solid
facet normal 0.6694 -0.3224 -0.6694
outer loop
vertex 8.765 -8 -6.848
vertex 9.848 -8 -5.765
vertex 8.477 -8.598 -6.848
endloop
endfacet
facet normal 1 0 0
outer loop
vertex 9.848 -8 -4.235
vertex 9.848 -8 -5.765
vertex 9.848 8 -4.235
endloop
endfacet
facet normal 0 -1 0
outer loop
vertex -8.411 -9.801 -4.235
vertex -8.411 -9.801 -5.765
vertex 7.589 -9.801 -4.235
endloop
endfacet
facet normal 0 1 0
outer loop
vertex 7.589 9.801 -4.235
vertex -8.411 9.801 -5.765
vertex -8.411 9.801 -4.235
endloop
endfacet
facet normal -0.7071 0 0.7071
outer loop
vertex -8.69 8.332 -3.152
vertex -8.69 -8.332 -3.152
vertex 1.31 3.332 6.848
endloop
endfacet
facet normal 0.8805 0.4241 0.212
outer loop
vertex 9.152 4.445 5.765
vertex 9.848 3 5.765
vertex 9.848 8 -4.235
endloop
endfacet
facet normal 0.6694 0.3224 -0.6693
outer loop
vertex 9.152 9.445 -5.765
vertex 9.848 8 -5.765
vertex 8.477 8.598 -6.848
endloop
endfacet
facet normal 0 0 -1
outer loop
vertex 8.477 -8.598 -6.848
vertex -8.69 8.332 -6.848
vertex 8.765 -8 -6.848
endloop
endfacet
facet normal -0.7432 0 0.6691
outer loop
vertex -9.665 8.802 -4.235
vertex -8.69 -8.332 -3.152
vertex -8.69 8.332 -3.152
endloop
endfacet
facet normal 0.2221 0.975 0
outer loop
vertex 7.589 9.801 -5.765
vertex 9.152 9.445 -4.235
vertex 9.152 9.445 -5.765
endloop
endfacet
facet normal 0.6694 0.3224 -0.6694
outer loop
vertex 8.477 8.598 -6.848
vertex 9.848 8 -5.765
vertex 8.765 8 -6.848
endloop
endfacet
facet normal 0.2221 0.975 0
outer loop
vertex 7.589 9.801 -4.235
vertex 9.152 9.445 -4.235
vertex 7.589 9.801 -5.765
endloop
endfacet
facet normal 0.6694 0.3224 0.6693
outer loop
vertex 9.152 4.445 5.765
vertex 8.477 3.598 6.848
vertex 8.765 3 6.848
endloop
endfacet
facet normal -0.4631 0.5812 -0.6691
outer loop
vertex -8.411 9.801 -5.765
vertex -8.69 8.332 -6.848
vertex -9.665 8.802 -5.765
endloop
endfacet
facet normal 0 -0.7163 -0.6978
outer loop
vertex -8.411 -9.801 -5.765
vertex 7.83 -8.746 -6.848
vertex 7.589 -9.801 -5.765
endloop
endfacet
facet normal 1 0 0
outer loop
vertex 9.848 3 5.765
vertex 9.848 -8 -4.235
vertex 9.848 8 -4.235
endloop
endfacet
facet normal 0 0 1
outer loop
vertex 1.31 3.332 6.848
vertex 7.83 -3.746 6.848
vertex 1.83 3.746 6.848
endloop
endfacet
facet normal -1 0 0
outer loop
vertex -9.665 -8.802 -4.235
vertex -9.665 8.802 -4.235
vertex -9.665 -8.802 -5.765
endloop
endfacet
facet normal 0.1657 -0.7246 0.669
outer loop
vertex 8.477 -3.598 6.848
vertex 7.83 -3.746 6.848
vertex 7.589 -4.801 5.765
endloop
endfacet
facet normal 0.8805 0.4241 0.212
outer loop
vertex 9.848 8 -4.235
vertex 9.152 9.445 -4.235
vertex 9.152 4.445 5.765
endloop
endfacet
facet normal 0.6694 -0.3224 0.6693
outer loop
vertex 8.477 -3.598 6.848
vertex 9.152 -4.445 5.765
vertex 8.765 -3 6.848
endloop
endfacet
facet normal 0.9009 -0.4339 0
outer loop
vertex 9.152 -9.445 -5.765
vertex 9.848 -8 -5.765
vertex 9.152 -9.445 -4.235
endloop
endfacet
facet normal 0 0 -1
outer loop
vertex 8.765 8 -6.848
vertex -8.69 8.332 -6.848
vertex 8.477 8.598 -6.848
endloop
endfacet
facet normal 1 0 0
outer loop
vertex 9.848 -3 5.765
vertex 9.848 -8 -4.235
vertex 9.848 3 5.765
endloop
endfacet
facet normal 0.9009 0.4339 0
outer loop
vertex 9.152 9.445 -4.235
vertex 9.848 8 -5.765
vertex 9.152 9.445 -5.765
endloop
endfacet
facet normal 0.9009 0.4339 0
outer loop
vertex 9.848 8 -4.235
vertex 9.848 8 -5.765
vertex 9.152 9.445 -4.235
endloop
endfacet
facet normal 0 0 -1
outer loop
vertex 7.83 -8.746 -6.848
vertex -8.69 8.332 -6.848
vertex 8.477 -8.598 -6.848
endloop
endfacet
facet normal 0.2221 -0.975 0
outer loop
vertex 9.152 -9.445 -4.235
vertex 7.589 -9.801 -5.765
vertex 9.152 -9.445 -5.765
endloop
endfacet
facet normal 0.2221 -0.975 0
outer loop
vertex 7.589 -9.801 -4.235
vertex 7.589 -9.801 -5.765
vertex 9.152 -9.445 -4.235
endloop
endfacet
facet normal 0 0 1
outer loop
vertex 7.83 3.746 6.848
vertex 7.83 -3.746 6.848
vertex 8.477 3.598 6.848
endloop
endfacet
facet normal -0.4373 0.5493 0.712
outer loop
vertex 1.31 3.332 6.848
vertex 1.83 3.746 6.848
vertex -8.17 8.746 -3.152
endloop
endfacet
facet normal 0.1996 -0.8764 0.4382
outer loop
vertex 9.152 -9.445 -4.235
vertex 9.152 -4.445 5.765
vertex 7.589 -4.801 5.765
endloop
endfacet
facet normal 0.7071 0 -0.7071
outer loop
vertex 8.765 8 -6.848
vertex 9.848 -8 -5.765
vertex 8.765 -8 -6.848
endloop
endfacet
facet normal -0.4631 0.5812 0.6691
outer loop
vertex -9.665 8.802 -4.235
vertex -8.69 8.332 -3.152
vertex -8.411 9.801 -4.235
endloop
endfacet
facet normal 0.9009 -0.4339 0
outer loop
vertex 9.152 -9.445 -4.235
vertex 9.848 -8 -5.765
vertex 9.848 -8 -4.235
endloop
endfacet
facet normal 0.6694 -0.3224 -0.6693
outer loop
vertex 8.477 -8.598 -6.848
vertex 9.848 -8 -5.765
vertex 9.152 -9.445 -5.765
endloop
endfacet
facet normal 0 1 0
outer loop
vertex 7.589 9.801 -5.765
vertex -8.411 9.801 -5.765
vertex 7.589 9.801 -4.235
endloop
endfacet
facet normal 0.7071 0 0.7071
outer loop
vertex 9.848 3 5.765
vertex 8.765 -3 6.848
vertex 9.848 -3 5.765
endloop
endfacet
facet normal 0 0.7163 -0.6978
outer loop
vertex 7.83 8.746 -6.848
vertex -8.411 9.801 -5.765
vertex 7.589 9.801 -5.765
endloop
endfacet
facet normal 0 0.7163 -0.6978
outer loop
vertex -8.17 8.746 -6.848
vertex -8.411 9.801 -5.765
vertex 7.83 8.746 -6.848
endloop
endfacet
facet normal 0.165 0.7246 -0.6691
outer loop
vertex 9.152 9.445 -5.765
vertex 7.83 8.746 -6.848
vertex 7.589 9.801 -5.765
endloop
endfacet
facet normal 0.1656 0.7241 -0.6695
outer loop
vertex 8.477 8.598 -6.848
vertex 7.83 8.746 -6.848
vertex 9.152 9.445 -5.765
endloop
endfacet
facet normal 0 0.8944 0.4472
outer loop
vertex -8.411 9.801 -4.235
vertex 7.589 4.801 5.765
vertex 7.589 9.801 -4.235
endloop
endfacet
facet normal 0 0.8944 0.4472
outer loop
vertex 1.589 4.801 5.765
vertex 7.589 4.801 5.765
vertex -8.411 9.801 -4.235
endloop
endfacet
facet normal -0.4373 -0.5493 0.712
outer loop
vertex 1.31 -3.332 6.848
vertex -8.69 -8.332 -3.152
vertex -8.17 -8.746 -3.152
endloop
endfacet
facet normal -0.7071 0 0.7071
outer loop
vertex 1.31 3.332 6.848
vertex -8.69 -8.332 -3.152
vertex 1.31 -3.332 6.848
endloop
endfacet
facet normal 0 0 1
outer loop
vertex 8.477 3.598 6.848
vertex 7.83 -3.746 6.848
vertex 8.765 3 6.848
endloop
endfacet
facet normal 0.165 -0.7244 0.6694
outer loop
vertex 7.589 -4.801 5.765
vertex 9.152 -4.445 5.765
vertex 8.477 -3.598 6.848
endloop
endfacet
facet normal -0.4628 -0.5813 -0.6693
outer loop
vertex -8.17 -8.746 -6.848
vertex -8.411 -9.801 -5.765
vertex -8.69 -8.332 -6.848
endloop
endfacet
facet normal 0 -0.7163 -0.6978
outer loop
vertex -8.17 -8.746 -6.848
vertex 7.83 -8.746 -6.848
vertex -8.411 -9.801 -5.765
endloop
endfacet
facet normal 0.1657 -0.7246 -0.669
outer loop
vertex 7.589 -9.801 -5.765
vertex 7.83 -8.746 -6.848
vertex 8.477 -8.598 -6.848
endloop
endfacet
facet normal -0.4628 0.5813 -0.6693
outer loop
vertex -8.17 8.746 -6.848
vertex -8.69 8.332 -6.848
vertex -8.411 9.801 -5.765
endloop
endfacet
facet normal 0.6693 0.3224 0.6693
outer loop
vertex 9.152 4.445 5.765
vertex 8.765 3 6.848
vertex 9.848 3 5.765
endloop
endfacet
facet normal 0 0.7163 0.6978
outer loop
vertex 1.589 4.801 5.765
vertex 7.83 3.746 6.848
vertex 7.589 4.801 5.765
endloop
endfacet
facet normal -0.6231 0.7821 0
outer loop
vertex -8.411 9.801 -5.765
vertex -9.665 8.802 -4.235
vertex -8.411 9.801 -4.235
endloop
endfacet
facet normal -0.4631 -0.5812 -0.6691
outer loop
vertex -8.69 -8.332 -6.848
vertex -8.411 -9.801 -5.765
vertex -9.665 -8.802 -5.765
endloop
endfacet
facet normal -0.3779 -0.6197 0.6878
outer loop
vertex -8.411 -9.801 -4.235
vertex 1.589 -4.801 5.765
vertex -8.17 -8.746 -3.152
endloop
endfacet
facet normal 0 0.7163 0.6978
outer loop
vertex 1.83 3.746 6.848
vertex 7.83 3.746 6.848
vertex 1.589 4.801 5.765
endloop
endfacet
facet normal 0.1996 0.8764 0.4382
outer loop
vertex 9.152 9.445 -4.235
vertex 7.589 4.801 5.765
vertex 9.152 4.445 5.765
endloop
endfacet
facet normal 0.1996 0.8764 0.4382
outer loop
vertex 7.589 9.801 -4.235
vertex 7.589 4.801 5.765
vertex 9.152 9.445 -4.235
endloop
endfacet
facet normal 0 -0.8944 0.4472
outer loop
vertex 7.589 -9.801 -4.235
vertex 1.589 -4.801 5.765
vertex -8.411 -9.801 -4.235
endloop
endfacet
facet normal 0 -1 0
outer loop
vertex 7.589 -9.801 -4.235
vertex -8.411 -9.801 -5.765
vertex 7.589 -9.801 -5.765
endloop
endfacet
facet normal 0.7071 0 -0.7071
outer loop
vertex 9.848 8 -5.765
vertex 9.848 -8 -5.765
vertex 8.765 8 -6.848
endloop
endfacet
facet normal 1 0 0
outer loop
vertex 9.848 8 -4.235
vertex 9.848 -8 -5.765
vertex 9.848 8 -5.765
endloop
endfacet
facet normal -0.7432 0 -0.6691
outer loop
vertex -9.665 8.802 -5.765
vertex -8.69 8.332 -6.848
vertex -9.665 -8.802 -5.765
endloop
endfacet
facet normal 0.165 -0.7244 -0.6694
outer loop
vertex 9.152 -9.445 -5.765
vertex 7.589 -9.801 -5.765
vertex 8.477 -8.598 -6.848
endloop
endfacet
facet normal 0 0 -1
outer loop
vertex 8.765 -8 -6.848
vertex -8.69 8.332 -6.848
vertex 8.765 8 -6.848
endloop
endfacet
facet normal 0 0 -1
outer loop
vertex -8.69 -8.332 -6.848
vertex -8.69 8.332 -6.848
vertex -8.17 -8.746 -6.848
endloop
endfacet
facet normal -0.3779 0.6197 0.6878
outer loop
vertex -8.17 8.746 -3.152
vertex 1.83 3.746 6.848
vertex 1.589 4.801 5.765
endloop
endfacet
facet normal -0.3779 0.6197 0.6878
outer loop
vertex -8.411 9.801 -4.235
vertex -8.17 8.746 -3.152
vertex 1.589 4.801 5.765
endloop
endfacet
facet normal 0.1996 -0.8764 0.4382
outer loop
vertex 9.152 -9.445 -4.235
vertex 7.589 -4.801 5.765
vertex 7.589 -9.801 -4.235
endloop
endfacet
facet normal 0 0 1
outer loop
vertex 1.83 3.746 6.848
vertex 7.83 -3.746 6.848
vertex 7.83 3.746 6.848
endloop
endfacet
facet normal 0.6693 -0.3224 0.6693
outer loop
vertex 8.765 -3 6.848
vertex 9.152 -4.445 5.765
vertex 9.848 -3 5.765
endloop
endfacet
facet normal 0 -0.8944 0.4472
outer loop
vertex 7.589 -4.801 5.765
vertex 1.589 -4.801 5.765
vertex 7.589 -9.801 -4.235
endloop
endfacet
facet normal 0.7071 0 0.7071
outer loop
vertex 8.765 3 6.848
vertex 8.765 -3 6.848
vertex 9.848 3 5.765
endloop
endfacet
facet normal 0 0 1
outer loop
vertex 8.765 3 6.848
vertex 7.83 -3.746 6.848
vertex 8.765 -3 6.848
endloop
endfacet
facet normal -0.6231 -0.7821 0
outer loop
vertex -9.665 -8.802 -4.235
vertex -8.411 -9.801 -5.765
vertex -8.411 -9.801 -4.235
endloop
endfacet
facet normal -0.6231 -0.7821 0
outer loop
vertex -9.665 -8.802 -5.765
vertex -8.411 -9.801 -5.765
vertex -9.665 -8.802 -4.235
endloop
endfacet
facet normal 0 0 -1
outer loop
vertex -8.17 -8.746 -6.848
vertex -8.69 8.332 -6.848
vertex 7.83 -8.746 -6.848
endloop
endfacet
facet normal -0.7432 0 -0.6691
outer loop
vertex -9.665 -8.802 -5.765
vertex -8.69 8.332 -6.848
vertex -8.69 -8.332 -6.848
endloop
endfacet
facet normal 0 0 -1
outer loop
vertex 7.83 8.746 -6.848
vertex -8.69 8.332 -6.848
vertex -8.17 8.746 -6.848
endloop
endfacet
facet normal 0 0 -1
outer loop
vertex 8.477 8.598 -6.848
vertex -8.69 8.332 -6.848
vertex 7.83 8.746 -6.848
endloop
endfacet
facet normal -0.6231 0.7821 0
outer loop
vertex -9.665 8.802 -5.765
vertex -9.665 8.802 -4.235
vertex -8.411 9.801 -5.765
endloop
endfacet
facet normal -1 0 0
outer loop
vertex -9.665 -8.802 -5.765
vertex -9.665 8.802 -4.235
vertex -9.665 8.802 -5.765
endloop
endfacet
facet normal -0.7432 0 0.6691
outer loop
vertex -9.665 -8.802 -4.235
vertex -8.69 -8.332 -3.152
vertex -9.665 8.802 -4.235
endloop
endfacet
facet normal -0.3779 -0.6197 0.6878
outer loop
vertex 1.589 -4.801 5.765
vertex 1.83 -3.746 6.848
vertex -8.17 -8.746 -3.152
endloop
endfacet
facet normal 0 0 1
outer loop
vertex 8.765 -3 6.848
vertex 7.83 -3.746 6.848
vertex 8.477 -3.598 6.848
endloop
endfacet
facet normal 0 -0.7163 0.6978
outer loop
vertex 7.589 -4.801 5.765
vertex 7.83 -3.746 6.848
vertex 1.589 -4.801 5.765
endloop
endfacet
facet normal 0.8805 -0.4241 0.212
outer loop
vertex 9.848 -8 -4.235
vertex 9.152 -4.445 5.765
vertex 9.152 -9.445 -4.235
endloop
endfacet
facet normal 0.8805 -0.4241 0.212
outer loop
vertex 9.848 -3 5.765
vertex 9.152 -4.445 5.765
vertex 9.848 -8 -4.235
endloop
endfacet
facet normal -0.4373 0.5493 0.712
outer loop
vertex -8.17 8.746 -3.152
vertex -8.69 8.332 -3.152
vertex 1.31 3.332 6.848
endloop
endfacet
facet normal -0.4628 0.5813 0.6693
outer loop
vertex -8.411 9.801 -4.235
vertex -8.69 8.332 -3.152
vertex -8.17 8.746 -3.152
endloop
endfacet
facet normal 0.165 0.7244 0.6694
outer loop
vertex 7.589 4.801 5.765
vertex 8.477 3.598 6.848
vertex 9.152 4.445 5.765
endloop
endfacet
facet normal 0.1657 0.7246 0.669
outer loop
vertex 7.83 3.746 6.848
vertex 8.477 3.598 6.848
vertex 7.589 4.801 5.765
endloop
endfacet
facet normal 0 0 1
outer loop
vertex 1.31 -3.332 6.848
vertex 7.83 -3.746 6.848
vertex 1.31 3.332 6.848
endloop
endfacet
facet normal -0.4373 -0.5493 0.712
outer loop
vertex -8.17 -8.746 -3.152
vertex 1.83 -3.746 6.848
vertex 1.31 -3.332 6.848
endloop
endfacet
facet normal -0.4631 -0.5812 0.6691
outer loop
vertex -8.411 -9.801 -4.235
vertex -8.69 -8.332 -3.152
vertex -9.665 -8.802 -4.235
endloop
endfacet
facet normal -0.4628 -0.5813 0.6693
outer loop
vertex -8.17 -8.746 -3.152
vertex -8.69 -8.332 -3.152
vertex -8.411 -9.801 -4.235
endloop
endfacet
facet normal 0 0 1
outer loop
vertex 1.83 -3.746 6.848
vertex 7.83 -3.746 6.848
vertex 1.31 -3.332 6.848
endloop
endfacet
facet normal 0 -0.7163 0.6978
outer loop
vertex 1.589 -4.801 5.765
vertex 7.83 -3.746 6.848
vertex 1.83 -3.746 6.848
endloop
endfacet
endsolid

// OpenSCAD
module roundedPyramid(baseSize, height, topSize=[0,0], edgeR=2, center=true, topOffset=[0,0,0]){
    ml=min(baseSize[0], baseSize[1])/2;
    er=ml<edgeR ? ml:edgeR;
    bx=baseSize[0]/2-er<0?0:baseSize[0]/2-er;
    by=baseSize[1]/2-er<0?0:baseSize[1]/2-er;
    tx=topSize[0]/2-er<0?0:topSize[0]/2-er;
    ty=topSize[1]/2-er<0?0:topSize[1]/2-er;
    translate([center?0:baseSize[0]/2,center?0:baseSize[1]/2,center?-height/2:0])
    hull(){
        translate([bx, by, 0])sphere(r=er);
        translate([-bx, by, 0])sphere(r=er);
        translate([bx, -by, 0])sphere(r=er);
        translate([-bx, -by, 0])sphere(r=er);
        translate(topOffset){
        translate([tx, ty, height])sphere(r=er);
        translate([-tx, ty, height])sphere(r=er);
        translate([tx, -ty, height])sphere(r=er);
        translate([-tx, -ty, height])sphere(r=er);
    }
    }
}

roundedPyramid([20,20], 10,[10,10], 2, true,[5,0,0]);
